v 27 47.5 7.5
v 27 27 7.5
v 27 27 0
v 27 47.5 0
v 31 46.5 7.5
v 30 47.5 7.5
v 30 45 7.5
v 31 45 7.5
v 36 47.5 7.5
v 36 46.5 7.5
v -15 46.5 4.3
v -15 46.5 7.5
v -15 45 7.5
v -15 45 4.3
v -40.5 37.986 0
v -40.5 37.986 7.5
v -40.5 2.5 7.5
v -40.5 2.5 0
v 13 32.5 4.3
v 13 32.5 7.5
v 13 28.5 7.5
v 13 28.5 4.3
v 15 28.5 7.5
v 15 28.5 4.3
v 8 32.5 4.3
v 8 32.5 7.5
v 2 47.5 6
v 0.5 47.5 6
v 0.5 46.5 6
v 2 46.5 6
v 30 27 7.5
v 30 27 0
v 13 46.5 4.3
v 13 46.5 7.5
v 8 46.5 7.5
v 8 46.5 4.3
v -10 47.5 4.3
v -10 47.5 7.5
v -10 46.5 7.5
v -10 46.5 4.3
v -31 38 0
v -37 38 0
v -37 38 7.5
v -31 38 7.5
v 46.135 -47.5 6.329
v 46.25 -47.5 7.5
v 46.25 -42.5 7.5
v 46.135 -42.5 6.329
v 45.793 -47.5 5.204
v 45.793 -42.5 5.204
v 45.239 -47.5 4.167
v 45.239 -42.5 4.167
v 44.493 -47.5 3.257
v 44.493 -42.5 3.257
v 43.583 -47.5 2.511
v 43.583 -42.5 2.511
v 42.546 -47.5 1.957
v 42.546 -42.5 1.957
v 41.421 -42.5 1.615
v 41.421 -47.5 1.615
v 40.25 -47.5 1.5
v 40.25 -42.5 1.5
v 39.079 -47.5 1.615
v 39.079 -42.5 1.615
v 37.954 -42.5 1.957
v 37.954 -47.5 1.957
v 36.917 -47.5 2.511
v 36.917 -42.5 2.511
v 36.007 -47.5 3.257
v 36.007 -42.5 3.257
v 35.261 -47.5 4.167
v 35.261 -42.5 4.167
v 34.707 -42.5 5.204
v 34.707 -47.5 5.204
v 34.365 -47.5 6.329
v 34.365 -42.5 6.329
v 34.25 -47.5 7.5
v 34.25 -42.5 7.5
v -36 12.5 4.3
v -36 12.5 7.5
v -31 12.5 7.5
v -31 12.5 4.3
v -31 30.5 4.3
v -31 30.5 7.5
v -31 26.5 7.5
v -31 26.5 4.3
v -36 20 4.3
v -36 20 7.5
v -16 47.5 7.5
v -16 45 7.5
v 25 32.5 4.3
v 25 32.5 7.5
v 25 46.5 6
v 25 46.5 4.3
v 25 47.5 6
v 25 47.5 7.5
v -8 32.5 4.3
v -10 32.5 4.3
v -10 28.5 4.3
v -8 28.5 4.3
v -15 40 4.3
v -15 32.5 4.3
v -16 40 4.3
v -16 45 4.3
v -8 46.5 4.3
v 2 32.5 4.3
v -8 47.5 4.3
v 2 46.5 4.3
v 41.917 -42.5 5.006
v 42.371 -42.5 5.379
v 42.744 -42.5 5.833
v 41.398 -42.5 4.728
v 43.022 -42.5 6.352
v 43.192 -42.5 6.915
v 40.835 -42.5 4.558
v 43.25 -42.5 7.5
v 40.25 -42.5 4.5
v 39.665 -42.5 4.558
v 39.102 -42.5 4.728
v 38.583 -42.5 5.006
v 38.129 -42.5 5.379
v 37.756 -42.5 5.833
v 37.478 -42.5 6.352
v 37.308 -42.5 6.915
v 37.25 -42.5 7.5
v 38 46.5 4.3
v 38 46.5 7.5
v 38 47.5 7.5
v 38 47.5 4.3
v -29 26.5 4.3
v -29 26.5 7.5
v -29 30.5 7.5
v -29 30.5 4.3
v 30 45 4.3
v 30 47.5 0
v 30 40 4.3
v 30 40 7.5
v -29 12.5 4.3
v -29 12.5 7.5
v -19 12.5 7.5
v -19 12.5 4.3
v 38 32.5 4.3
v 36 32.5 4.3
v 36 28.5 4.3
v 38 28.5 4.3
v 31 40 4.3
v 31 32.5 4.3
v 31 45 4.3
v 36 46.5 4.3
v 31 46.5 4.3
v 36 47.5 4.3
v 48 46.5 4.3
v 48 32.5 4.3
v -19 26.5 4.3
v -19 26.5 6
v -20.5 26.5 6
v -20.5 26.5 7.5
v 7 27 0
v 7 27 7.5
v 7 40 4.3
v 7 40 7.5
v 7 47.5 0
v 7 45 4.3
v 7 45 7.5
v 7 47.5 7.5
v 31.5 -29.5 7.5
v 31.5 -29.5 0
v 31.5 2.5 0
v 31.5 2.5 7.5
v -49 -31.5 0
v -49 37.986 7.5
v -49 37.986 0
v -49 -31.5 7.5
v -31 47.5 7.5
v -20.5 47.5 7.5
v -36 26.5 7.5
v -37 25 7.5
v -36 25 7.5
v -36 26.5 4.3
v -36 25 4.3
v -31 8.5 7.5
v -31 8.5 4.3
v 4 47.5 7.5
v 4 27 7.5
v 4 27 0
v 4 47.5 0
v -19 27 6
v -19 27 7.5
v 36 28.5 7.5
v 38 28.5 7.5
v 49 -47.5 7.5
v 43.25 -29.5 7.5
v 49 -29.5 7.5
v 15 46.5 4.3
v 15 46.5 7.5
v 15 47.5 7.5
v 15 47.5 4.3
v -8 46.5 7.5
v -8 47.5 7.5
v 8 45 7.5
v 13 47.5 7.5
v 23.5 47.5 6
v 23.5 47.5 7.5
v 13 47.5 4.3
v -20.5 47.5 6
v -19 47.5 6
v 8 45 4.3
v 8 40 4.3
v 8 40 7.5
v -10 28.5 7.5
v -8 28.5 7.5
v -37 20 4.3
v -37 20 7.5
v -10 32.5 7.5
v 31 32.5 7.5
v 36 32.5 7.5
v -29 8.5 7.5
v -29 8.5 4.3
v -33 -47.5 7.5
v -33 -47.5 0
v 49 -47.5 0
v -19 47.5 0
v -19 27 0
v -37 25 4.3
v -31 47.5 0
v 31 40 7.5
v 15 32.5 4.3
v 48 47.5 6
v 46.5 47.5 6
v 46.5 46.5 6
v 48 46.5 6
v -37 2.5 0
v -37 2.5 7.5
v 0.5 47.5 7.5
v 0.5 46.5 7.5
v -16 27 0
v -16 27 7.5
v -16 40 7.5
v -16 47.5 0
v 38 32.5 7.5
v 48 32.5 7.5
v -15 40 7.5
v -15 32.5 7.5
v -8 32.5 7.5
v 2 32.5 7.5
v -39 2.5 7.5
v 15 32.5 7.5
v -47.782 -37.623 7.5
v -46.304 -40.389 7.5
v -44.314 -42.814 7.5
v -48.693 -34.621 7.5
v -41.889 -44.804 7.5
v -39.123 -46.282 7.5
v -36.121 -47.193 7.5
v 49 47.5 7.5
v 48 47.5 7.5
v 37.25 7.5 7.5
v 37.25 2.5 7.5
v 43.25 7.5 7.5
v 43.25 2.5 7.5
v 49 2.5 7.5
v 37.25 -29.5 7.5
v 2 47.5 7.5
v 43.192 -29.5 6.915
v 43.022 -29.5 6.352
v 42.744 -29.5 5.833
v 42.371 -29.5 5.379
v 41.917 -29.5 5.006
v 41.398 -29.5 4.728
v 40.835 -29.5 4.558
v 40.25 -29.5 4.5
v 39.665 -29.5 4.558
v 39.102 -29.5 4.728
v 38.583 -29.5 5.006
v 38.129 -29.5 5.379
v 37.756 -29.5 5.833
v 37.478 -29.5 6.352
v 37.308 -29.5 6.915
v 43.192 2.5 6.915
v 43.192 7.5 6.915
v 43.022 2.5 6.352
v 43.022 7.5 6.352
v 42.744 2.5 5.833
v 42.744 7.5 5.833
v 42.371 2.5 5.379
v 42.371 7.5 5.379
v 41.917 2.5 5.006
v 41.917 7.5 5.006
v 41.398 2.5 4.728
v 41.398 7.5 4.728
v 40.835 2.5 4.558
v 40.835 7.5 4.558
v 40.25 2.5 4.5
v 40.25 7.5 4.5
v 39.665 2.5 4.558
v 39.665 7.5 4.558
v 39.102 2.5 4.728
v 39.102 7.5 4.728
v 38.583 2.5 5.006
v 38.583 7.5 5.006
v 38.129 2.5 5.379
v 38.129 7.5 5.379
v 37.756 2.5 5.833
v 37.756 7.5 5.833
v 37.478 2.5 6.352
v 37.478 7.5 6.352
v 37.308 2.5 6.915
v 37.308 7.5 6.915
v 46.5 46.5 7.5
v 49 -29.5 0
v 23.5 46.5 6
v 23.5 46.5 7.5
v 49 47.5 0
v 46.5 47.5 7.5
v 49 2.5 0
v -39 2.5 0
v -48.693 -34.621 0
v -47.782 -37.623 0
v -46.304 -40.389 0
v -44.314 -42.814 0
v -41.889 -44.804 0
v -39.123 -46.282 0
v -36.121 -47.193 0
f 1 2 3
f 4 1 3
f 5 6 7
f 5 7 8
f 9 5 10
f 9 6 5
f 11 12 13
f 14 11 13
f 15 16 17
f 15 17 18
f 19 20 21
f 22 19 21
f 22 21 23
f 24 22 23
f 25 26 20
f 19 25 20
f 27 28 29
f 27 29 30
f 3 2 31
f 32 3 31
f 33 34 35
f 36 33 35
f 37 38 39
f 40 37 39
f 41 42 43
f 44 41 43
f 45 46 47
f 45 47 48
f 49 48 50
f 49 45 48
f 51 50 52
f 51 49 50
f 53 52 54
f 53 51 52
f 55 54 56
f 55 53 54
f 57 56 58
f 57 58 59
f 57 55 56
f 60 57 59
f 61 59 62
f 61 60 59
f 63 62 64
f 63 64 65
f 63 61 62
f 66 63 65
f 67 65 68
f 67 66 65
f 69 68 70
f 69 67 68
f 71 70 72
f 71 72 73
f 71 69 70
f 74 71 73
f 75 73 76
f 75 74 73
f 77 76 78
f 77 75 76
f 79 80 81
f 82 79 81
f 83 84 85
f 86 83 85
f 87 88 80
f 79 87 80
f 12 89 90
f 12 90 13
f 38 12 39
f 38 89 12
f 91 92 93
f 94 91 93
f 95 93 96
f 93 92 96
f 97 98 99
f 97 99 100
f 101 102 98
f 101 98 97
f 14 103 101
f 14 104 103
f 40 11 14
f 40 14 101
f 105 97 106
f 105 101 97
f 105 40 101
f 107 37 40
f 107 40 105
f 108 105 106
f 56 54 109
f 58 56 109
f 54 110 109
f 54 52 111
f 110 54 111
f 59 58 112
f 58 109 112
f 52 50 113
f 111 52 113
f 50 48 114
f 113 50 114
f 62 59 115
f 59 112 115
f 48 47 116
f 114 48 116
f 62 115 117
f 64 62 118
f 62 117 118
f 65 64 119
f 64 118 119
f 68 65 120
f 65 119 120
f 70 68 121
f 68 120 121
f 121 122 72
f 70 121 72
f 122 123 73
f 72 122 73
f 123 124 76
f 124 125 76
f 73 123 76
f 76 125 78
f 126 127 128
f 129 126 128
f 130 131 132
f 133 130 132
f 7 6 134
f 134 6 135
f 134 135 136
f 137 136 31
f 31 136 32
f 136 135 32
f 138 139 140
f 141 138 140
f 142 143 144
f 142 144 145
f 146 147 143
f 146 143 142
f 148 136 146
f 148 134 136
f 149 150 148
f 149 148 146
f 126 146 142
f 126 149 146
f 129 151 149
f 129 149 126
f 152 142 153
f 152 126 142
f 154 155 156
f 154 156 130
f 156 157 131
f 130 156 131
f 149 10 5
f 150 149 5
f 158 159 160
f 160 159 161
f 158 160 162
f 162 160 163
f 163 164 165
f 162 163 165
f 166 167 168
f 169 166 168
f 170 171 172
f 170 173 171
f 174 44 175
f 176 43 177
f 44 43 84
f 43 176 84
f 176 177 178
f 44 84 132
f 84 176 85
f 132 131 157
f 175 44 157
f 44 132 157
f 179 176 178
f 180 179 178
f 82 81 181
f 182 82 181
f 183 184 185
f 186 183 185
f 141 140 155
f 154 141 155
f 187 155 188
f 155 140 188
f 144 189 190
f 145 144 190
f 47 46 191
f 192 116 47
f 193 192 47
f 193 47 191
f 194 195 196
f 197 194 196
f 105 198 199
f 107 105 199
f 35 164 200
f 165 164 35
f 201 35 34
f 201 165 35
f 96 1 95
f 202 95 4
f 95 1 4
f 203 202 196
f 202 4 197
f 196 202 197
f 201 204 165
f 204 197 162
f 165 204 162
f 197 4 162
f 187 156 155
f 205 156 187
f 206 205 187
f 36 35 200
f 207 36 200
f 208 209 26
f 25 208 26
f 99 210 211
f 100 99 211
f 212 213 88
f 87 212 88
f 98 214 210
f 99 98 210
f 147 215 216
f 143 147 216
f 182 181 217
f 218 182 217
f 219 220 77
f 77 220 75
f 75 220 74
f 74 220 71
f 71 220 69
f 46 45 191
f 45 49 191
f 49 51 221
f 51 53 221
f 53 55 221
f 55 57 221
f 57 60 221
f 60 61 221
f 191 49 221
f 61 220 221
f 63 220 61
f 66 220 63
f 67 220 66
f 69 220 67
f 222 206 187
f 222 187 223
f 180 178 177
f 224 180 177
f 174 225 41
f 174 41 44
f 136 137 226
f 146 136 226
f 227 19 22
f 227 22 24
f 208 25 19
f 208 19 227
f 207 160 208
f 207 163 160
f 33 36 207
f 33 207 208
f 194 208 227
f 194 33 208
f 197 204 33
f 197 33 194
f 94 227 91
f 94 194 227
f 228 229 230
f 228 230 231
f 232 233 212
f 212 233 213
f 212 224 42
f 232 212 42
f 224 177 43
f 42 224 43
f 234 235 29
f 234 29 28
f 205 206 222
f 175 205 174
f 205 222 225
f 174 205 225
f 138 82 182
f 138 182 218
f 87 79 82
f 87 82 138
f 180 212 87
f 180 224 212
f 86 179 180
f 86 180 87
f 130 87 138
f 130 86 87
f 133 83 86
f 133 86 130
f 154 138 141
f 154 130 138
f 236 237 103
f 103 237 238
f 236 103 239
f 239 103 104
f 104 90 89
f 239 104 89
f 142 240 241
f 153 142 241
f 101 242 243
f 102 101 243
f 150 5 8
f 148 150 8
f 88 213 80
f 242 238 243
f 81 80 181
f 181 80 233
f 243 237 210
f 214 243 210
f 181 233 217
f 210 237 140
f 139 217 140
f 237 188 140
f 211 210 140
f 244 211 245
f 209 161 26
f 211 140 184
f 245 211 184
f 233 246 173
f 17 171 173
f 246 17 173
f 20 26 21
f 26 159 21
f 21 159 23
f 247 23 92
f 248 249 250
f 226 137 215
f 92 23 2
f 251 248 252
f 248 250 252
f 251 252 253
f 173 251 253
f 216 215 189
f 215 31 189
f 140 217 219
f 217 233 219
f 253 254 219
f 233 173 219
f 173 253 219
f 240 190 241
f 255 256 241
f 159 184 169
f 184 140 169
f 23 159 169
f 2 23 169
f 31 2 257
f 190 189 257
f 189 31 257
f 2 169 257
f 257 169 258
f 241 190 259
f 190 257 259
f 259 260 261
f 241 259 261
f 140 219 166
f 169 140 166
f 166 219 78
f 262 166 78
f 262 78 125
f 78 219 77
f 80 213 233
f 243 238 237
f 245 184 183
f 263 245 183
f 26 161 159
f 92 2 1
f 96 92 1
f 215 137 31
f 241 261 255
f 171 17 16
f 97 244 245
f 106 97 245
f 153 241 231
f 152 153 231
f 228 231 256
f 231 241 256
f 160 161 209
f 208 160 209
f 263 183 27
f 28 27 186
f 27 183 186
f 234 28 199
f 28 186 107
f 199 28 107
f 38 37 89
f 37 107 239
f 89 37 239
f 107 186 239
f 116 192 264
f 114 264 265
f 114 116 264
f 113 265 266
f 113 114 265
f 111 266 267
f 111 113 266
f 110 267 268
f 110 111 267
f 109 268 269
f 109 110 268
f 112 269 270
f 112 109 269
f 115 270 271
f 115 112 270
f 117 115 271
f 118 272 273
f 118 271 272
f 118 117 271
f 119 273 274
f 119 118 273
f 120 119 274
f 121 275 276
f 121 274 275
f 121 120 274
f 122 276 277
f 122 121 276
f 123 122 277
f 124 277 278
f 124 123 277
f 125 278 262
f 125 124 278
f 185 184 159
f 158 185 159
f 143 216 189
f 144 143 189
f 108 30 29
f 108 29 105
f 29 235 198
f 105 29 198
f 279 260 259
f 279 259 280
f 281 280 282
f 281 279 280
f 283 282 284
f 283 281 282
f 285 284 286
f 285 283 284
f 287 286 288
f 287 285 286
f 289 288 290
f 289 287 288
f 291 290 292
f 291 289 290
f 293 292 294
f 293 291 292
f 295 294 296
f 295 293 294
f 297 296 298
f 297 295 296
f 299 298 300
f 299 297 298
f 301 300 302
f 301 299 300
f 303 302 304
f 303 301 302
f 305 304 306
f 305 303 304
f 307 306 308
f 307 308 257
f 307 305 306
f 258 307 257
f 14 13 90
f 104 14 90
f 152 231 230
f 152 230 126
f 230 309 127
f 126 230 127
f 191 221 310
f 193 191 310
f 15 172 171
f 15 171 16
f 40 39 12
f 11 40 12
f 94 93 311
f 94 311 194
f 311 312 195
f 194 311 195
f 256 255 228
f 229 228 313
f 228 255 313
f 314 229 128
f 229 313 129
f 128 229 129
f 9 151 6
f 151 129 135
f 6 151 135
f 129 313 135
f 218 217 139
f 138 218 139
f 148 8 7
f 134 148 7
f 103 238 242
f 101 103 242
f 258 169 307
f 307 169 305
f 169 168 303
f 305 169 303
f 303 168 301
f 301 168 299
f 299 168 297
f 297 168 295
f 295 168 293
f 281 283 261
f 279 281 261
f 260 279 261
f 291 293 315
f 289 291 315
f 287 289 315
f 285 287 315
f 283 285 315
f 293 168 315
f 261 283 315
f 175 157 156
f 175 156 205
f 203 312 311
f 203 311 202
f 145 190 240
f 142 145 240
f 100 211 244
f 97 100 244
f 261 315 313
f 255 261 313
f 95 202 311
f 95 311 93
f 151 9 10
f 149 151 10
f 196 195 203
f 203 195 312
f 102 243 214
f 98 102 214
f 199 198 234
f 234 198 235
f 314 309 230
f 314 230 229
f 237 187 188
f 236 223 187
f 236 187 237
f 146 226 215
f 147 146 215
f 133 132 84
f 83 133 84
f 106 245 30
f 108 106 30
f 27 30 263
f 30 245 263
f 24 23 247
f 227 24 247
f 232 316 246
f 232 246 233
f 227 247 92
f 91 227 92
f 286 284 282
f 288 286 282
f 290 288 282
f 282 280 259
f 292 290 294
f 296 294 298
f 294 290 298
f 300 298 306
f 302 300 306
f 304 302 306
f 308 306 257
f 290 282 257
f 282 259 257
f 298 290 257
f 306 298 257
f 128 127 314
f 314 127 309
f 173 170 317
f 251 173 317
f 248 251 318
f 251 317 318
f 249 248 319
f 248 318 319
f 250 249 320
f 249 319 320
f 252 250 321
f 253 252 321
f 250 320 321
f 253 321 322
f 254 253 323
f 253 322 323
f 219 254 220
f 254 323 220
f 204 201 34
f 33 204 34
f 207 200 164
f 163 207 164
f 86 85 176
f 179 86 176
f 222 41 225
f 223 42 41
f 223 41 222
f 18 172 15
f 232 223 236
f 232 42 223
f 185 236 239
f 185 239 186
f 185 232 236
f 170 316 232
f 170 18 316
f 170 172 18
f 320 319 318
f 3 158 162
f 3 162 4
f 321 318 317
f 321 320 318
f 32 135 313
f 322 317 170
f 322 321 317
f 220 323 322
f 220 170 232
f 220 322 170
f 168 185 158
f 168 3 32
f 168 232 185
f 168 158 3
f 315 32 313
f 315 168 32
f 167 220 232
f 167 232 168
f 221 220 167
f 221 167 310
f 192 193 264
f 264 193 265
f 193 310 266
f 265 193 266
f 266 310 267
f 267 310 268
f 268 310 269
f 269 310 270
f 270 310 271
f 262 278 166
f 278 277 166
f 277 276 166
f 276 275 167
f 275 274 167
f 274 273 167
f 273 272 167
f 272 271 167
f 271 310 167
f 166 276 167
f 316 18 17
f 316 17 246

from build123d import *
from OCP.BRepAlgoAPI import BRepAlgoAPI_Cut
from OCP.TopTools import TopTools_ListOfShape

# Parameters (mm, degrees)
BOSS_EXTRUDE1_DEPTH = 7.5
CUT_EXTRUDE1_DEPTH  = 3.2
CUT_EXTRUDE2_DEPTH  = 5
CUT_EXTRUDE3_DEPTH  = 50
CUT_EXTRUDE4_REACH  = 70.655
SKETCH5_W           = 3
SKETCH5_H           = 17
CUT_EXTRUDE5_REACH  = 70.655
SKETCH8_W           = 12
SKETCH8_H           = 37
CUT_EXTRUDE6_DEPTH  = 3.2
SKETCH10_W          = 10
SKETCH10_H          = 7.5
BOSS_EXTRUDE2_DEPTH = 27.486353186
SKETCH11_W          = 3
SKETCH11_H          = 7.5
CUT_EXTRUDE7_DEPTH  = 3.5
SKETCH12_W          = 2
SKETCH12_H          = 7.5
CUT_EXTRUDE8_DEPTH  = 4
SKETCH13_W          = 2
SKETCH13_H          = 7.5
CUT_EXTRUDE9_DEPTH  = 4
SKETCH14_W          = 7.5
SKETCH14_H          = 9.5
CUT_EXTRUDE10_DEPTH = 6
SKETCH15_W          = 1.5
SKETCH15_H          = 21
SKETCH15_H_2        = 1
CUT_EXTRUDE11_DEPTH = 1.5
SKETCH16_W          = 1.5
SKETCH16_H          = 7.5
CUT_EXTRUDE12_DEPTH = 35.486360958


with BuildPart() as part:
    # Sketch1 → Boss-Extrude1 (new body)
    with BuildSketch(Plane.XY):
        with BuildLine():
            Line((-33, -47.5), (49, -47.5))
            Line((49, -47.5), (49, -29.5))
            Line((49, -29.5), (31.5, -29.5))
            Line((31.5, -29.5), (31.5, 2.5))
            Line((31.5, 2.5), (49, 2.5))
            Line((49, 2.5), (49, 47.5))
            Line((49, 47.5), (30, 47.5))
            Line((30, 47.5), (30, 30.5))
            Line((30, 30.5), (27, 30.5))
            Line((27, 30.5), (27, 47.5))
            Line((27, 47.5), (-49, 47.5))
            Line((-49, 47.5), (-49, -31.5))
            ThreePointArc((-49, -31.5), (-44.313708499, -42.813708499), (-33, -47.5))
        make_face()
    extrude(amount=BOSS_EXTRUDE1_DEPTH)

    # Sketch2 → Cut-Extrude1 (cut)
    with BuildSketch(Plane.XY.offset(7.5)):
        Polygon((30, 40), (31, 40), (31, 32.5), (36, 32.5), (36, 28.5), (38, 28.5), (38, 32.5), (48, 32.5), (48, 46.5), (38, 46.5), (38, 47.5), (36, 47.5), (36, 46.5), (31, 46.5), (31, 45), (30, 45), align=None)
        Polygon((-16, 40), (-15, 40), (-15, 32.5), (-10, 32.5), (-10, 28.5), (-8, 28.5), (-8, 32.5), (2, 32.5), (2, 46.5), (-8, 46.5), (-8, 47.5), (-10, 47.5), (-10, 46.5), (-15, 46.5), (-15, 45), (-16, 45), align=None)
        Polygon((7, 40), (8, 40), (8, 32.5), (13, 32.5), (13, 28.5), (15, 28.5), (15, 32.5), (25, 32.5), (25, 46.5), (15, 46.5), (15, 47.5), (13, 47.5), (13, 46.5), (8, 46.5), (8, 45), (7, 45), align=None)
    extrude(amount=-CUT_EXTRUDE1_DEPTH, mode=Mode.SUBTRACT)

    # Sketch3 → Cut-Extrude2 (cut)
    with BuildSketch(Plane.XZ.offset(47.5)):
        with BuildLine():
            Line((34.25, 7.5), (46.25, 7.5))
            ThreePointArc((46.25, 7.5), (40.25, 1.5), (34.25, 7.5))
        make_face()
    extrude(amount=-CUT_EXTRUDE2_DEPTH, mode=Mode.SUBTRACT)

    # Sketch4 → Cut-Extrude3 (cut)
    with BuildSketch(Plane.XZ.offset(42.5)):
        with BuildLine():
            Line((37.25, 7.5), (43.25, 7.5))
            ThreePointArc((43.25, 7.5), (40.25, 4.5), (37.25, 7.5))
        make_face()
    extrude(amount=-CUT_EXTRUDE3_DEPTH, mode=Mode.SUBTRACT)

    # Sketch5 → Cut-Extrude4 (cut, up to next)
    with BuildSketch(Plane.XY.offset(7.5), mode=Mode.PRIVATE) as cut_extrude4_sk1:
        with Locations((5.5, 39)):
            Rectangle(SKETCH5_W, SKETCH5_H)
    cut_extrude4_tool1 = extrude(cut_extrude4_sk1.sketch, amount=-CUT_EXTRUDE4_REACH, mode=Mode.PRIVATE) & part.part
    # Sketch5 → Cut-Extrude4 (cut, up to next)
    with BuildSketch(Plane.XY.offset(7.5), mode=Mode.PRIVATE) as cut_extrude4_sk2:
        with Locations((-17.5, 39)):
            Rectangle(SKETCH5_W, SKETCH5_H)
    cut_extrude4_tool2 = extrude(cut_extrude4_sk2.sketch, amount=-CUT_EXTRUDE4_REACH, mode=Mode.PRIVATE) & part.part
    add(cut_extrude4_tool1.solids().sort_by_distance((5.5, 39, 7.5))[0], mode=Mode.SUBTRACT)
    add(cut_extrude4_tool2.solids().sort_by_distance((-17.5, 39, 7.5))[0], mode=Mode.SUBTRACT)

    # Sketch8 → Cut-Extrude5 (cut, up to next)
    with BuildSketch(Plane.XY.offset(7.5), mode=Mode.PRIVATE) as cut_extrude5_sk1:
        with Locations((-43, 29)):
            Rectangle(SKETCH8_W, SKETCH8_H)
    cut_extrude5_tool1 = extrude(cut_extrude5_sk1.sketch, amount=-CUT_EXTRUDE5_REACH, mode=Mode.PRIVATE) & part.part
    add(cut_extrude5_tool1.solids().sort_by_distance((-43, 29, 7.5))[0], mode=Mode.SUBTRACT)

    # Sketch9 → Cut-Extrude6 (cut)
    with BuildSketch(Plane.XY.offset(7.5)):
        Polygon((-37, 20), (-36, 20), (-36, 12.5), (-31, 12.5), (-31, 8.5), (-29, 8.5), (-29, 12.5), (-19, 12.5), (-19, 26.5), (-29, 26.5), (-29, 30.5), (-31, 30.5), (-31, 26.5), (-36, 26.5), (-36, 25), (-37, 25), align=None)
    extrude(amount=-CUT_EXTRUDE6_DEPTH, mode=Mode.SUBTRACT)

    # Sketch10 → Boss-Extrude2 (add)
    with BuildSketch(Plane(origin=(0, 10.5, 0), x_dir=(1, 0, 0), z_dir=(0, 1, 0))):
        with Locations((-44, -3.75)):
            Rectangle(SKETCH10_W, SKETCH10_H)
    extrude(amount=BOSS_EXTRUDE2_DEPTH)

    # Sketch11 → Cut-Extrude7 (cut)
    with BuildSketch(Plane(origin=(0, 30.5, 0), x_dir=(1, 0, 0), z_dir=(0, 1, 0))):
        with Locations((-17.5, -3.75)):
            Rectangle(SKETCH11_W, SKETCH11_H)
        with Locations((5.5, -3.75)):
            Rectangle(SKETCH11_W, SKETCH11_H)
        with Locations((28.5, -3.75)):
            Rectangle(SKETCH11_W, SKETCH11_H)
    extrude(amount=-CUT_EXTRUDE7_DEPTH, mode=Mode.SUBTRACT)

    # Sketch12 → Cut-Extrude8 (cut)
    with BuildSketch(Plane(origin=(0, 10.5, 0), x_dir=(1, 0, 0), z_dir=(0, 1, 0))):
        with Locations((-38, -3.75)):
            Rectangle(SKETCH12_W, SKETCH12_H)
    extrude(amount=-CUT_EXTRUDE8_DEPTH, mode=Mode.SUBTRACT)

    # Sketch13 → Cut-Extrude9 (cut)
    with BuildSketch(Plane(origin=(0, 6.5, 0), x_dir=(1, 0, 0), z_dir=(0, 1, 0))):
        with Locations((-38, -3.75)):
            Rectangle(SKETCH13_W, SKETCH13_H)
    extrude(amount=-CUT_EXTRUDE9_DEPTH, mode=Mode.SUBTRACT)

    # Sketch14 → Cut-Extrude10 (cut)
    with BuildSketch(Plane.ZY.offset(37)):
        with Locations((3.75, 42.75)):
            Rectangle(SKETCH14_W, SKETCH14_H)
    extrude(amount=-CUT_EXTRUDE10_DEPTH, mode=Mode.SUBTRACT)

    # Sketch15 → Cut-Extrude11 (cut)
    with BuildSketch(Plane.XY.offset(7.5)):
        with Locations((-19.75, 37)):
            Rectangle(SKETCH15_W, SKETCH15_H)
        with Locations((1.25, 47)):
            Rectangle(SKETCH15_W, SKETCH15_H_2)
        with Locations((24.25, 47)):
            Rectangle(SKETCH15_W, SKETCH15_H_2)
        with Locations((47.25, 47)):
            Rectangle(SKETCH15_W, SKETCH15_H_2)
    extrude(amount=-CUT_EXTRUDE11_DEPTH, mode=Mode.SUBTRACT)


with BuildPart() as cut_extrude12_tool:
    # Sketch16 → Cut-Extrude12 (new body)
    with BuildSketch(Plane(origin=(0, 37.986353186, 0), x_dir=(1, 0, 0), z_dir=(0, 1, 0))):
        with Locations((-39.75, -3.75)):
            Rectangle(SKETCH16_W, SKETCH16_H)
    extrude(amount=-CUT_EXTRUDE12_DEPTH)


with BuildPart() as part_1:
    add(part.part)

    # Cut-Extrude12: cut by cut_extrude12_tool, with a tolerance
    cut_extrude12_stock = TopTools_ListOfShape()
    cut_extrude12_stock.Append(part_1.part.wrapped)
    cut_extrude12_tools = TopTools_ListOfShape()
    cut_extrude12_tools.Append(cut_extrude12_tool.part.wrapped)
    cut_extrude12_cut = BRepAlgoAPI_Cut()
    cut_extrude12_cut.SetArguments(cut_extrude12_stock)
    cut_extrude12_cut.SetTools(cut_extrude12_tools)
    cut_extrude12_cut.SetFuzzyValue(0.00001)
    cut_extrude12_cut.Build()
    add(Compound.cast(cut_extrude12_cut.Shape()).solids(), mode=Mode.REPLACE)


solid = part_1.part
